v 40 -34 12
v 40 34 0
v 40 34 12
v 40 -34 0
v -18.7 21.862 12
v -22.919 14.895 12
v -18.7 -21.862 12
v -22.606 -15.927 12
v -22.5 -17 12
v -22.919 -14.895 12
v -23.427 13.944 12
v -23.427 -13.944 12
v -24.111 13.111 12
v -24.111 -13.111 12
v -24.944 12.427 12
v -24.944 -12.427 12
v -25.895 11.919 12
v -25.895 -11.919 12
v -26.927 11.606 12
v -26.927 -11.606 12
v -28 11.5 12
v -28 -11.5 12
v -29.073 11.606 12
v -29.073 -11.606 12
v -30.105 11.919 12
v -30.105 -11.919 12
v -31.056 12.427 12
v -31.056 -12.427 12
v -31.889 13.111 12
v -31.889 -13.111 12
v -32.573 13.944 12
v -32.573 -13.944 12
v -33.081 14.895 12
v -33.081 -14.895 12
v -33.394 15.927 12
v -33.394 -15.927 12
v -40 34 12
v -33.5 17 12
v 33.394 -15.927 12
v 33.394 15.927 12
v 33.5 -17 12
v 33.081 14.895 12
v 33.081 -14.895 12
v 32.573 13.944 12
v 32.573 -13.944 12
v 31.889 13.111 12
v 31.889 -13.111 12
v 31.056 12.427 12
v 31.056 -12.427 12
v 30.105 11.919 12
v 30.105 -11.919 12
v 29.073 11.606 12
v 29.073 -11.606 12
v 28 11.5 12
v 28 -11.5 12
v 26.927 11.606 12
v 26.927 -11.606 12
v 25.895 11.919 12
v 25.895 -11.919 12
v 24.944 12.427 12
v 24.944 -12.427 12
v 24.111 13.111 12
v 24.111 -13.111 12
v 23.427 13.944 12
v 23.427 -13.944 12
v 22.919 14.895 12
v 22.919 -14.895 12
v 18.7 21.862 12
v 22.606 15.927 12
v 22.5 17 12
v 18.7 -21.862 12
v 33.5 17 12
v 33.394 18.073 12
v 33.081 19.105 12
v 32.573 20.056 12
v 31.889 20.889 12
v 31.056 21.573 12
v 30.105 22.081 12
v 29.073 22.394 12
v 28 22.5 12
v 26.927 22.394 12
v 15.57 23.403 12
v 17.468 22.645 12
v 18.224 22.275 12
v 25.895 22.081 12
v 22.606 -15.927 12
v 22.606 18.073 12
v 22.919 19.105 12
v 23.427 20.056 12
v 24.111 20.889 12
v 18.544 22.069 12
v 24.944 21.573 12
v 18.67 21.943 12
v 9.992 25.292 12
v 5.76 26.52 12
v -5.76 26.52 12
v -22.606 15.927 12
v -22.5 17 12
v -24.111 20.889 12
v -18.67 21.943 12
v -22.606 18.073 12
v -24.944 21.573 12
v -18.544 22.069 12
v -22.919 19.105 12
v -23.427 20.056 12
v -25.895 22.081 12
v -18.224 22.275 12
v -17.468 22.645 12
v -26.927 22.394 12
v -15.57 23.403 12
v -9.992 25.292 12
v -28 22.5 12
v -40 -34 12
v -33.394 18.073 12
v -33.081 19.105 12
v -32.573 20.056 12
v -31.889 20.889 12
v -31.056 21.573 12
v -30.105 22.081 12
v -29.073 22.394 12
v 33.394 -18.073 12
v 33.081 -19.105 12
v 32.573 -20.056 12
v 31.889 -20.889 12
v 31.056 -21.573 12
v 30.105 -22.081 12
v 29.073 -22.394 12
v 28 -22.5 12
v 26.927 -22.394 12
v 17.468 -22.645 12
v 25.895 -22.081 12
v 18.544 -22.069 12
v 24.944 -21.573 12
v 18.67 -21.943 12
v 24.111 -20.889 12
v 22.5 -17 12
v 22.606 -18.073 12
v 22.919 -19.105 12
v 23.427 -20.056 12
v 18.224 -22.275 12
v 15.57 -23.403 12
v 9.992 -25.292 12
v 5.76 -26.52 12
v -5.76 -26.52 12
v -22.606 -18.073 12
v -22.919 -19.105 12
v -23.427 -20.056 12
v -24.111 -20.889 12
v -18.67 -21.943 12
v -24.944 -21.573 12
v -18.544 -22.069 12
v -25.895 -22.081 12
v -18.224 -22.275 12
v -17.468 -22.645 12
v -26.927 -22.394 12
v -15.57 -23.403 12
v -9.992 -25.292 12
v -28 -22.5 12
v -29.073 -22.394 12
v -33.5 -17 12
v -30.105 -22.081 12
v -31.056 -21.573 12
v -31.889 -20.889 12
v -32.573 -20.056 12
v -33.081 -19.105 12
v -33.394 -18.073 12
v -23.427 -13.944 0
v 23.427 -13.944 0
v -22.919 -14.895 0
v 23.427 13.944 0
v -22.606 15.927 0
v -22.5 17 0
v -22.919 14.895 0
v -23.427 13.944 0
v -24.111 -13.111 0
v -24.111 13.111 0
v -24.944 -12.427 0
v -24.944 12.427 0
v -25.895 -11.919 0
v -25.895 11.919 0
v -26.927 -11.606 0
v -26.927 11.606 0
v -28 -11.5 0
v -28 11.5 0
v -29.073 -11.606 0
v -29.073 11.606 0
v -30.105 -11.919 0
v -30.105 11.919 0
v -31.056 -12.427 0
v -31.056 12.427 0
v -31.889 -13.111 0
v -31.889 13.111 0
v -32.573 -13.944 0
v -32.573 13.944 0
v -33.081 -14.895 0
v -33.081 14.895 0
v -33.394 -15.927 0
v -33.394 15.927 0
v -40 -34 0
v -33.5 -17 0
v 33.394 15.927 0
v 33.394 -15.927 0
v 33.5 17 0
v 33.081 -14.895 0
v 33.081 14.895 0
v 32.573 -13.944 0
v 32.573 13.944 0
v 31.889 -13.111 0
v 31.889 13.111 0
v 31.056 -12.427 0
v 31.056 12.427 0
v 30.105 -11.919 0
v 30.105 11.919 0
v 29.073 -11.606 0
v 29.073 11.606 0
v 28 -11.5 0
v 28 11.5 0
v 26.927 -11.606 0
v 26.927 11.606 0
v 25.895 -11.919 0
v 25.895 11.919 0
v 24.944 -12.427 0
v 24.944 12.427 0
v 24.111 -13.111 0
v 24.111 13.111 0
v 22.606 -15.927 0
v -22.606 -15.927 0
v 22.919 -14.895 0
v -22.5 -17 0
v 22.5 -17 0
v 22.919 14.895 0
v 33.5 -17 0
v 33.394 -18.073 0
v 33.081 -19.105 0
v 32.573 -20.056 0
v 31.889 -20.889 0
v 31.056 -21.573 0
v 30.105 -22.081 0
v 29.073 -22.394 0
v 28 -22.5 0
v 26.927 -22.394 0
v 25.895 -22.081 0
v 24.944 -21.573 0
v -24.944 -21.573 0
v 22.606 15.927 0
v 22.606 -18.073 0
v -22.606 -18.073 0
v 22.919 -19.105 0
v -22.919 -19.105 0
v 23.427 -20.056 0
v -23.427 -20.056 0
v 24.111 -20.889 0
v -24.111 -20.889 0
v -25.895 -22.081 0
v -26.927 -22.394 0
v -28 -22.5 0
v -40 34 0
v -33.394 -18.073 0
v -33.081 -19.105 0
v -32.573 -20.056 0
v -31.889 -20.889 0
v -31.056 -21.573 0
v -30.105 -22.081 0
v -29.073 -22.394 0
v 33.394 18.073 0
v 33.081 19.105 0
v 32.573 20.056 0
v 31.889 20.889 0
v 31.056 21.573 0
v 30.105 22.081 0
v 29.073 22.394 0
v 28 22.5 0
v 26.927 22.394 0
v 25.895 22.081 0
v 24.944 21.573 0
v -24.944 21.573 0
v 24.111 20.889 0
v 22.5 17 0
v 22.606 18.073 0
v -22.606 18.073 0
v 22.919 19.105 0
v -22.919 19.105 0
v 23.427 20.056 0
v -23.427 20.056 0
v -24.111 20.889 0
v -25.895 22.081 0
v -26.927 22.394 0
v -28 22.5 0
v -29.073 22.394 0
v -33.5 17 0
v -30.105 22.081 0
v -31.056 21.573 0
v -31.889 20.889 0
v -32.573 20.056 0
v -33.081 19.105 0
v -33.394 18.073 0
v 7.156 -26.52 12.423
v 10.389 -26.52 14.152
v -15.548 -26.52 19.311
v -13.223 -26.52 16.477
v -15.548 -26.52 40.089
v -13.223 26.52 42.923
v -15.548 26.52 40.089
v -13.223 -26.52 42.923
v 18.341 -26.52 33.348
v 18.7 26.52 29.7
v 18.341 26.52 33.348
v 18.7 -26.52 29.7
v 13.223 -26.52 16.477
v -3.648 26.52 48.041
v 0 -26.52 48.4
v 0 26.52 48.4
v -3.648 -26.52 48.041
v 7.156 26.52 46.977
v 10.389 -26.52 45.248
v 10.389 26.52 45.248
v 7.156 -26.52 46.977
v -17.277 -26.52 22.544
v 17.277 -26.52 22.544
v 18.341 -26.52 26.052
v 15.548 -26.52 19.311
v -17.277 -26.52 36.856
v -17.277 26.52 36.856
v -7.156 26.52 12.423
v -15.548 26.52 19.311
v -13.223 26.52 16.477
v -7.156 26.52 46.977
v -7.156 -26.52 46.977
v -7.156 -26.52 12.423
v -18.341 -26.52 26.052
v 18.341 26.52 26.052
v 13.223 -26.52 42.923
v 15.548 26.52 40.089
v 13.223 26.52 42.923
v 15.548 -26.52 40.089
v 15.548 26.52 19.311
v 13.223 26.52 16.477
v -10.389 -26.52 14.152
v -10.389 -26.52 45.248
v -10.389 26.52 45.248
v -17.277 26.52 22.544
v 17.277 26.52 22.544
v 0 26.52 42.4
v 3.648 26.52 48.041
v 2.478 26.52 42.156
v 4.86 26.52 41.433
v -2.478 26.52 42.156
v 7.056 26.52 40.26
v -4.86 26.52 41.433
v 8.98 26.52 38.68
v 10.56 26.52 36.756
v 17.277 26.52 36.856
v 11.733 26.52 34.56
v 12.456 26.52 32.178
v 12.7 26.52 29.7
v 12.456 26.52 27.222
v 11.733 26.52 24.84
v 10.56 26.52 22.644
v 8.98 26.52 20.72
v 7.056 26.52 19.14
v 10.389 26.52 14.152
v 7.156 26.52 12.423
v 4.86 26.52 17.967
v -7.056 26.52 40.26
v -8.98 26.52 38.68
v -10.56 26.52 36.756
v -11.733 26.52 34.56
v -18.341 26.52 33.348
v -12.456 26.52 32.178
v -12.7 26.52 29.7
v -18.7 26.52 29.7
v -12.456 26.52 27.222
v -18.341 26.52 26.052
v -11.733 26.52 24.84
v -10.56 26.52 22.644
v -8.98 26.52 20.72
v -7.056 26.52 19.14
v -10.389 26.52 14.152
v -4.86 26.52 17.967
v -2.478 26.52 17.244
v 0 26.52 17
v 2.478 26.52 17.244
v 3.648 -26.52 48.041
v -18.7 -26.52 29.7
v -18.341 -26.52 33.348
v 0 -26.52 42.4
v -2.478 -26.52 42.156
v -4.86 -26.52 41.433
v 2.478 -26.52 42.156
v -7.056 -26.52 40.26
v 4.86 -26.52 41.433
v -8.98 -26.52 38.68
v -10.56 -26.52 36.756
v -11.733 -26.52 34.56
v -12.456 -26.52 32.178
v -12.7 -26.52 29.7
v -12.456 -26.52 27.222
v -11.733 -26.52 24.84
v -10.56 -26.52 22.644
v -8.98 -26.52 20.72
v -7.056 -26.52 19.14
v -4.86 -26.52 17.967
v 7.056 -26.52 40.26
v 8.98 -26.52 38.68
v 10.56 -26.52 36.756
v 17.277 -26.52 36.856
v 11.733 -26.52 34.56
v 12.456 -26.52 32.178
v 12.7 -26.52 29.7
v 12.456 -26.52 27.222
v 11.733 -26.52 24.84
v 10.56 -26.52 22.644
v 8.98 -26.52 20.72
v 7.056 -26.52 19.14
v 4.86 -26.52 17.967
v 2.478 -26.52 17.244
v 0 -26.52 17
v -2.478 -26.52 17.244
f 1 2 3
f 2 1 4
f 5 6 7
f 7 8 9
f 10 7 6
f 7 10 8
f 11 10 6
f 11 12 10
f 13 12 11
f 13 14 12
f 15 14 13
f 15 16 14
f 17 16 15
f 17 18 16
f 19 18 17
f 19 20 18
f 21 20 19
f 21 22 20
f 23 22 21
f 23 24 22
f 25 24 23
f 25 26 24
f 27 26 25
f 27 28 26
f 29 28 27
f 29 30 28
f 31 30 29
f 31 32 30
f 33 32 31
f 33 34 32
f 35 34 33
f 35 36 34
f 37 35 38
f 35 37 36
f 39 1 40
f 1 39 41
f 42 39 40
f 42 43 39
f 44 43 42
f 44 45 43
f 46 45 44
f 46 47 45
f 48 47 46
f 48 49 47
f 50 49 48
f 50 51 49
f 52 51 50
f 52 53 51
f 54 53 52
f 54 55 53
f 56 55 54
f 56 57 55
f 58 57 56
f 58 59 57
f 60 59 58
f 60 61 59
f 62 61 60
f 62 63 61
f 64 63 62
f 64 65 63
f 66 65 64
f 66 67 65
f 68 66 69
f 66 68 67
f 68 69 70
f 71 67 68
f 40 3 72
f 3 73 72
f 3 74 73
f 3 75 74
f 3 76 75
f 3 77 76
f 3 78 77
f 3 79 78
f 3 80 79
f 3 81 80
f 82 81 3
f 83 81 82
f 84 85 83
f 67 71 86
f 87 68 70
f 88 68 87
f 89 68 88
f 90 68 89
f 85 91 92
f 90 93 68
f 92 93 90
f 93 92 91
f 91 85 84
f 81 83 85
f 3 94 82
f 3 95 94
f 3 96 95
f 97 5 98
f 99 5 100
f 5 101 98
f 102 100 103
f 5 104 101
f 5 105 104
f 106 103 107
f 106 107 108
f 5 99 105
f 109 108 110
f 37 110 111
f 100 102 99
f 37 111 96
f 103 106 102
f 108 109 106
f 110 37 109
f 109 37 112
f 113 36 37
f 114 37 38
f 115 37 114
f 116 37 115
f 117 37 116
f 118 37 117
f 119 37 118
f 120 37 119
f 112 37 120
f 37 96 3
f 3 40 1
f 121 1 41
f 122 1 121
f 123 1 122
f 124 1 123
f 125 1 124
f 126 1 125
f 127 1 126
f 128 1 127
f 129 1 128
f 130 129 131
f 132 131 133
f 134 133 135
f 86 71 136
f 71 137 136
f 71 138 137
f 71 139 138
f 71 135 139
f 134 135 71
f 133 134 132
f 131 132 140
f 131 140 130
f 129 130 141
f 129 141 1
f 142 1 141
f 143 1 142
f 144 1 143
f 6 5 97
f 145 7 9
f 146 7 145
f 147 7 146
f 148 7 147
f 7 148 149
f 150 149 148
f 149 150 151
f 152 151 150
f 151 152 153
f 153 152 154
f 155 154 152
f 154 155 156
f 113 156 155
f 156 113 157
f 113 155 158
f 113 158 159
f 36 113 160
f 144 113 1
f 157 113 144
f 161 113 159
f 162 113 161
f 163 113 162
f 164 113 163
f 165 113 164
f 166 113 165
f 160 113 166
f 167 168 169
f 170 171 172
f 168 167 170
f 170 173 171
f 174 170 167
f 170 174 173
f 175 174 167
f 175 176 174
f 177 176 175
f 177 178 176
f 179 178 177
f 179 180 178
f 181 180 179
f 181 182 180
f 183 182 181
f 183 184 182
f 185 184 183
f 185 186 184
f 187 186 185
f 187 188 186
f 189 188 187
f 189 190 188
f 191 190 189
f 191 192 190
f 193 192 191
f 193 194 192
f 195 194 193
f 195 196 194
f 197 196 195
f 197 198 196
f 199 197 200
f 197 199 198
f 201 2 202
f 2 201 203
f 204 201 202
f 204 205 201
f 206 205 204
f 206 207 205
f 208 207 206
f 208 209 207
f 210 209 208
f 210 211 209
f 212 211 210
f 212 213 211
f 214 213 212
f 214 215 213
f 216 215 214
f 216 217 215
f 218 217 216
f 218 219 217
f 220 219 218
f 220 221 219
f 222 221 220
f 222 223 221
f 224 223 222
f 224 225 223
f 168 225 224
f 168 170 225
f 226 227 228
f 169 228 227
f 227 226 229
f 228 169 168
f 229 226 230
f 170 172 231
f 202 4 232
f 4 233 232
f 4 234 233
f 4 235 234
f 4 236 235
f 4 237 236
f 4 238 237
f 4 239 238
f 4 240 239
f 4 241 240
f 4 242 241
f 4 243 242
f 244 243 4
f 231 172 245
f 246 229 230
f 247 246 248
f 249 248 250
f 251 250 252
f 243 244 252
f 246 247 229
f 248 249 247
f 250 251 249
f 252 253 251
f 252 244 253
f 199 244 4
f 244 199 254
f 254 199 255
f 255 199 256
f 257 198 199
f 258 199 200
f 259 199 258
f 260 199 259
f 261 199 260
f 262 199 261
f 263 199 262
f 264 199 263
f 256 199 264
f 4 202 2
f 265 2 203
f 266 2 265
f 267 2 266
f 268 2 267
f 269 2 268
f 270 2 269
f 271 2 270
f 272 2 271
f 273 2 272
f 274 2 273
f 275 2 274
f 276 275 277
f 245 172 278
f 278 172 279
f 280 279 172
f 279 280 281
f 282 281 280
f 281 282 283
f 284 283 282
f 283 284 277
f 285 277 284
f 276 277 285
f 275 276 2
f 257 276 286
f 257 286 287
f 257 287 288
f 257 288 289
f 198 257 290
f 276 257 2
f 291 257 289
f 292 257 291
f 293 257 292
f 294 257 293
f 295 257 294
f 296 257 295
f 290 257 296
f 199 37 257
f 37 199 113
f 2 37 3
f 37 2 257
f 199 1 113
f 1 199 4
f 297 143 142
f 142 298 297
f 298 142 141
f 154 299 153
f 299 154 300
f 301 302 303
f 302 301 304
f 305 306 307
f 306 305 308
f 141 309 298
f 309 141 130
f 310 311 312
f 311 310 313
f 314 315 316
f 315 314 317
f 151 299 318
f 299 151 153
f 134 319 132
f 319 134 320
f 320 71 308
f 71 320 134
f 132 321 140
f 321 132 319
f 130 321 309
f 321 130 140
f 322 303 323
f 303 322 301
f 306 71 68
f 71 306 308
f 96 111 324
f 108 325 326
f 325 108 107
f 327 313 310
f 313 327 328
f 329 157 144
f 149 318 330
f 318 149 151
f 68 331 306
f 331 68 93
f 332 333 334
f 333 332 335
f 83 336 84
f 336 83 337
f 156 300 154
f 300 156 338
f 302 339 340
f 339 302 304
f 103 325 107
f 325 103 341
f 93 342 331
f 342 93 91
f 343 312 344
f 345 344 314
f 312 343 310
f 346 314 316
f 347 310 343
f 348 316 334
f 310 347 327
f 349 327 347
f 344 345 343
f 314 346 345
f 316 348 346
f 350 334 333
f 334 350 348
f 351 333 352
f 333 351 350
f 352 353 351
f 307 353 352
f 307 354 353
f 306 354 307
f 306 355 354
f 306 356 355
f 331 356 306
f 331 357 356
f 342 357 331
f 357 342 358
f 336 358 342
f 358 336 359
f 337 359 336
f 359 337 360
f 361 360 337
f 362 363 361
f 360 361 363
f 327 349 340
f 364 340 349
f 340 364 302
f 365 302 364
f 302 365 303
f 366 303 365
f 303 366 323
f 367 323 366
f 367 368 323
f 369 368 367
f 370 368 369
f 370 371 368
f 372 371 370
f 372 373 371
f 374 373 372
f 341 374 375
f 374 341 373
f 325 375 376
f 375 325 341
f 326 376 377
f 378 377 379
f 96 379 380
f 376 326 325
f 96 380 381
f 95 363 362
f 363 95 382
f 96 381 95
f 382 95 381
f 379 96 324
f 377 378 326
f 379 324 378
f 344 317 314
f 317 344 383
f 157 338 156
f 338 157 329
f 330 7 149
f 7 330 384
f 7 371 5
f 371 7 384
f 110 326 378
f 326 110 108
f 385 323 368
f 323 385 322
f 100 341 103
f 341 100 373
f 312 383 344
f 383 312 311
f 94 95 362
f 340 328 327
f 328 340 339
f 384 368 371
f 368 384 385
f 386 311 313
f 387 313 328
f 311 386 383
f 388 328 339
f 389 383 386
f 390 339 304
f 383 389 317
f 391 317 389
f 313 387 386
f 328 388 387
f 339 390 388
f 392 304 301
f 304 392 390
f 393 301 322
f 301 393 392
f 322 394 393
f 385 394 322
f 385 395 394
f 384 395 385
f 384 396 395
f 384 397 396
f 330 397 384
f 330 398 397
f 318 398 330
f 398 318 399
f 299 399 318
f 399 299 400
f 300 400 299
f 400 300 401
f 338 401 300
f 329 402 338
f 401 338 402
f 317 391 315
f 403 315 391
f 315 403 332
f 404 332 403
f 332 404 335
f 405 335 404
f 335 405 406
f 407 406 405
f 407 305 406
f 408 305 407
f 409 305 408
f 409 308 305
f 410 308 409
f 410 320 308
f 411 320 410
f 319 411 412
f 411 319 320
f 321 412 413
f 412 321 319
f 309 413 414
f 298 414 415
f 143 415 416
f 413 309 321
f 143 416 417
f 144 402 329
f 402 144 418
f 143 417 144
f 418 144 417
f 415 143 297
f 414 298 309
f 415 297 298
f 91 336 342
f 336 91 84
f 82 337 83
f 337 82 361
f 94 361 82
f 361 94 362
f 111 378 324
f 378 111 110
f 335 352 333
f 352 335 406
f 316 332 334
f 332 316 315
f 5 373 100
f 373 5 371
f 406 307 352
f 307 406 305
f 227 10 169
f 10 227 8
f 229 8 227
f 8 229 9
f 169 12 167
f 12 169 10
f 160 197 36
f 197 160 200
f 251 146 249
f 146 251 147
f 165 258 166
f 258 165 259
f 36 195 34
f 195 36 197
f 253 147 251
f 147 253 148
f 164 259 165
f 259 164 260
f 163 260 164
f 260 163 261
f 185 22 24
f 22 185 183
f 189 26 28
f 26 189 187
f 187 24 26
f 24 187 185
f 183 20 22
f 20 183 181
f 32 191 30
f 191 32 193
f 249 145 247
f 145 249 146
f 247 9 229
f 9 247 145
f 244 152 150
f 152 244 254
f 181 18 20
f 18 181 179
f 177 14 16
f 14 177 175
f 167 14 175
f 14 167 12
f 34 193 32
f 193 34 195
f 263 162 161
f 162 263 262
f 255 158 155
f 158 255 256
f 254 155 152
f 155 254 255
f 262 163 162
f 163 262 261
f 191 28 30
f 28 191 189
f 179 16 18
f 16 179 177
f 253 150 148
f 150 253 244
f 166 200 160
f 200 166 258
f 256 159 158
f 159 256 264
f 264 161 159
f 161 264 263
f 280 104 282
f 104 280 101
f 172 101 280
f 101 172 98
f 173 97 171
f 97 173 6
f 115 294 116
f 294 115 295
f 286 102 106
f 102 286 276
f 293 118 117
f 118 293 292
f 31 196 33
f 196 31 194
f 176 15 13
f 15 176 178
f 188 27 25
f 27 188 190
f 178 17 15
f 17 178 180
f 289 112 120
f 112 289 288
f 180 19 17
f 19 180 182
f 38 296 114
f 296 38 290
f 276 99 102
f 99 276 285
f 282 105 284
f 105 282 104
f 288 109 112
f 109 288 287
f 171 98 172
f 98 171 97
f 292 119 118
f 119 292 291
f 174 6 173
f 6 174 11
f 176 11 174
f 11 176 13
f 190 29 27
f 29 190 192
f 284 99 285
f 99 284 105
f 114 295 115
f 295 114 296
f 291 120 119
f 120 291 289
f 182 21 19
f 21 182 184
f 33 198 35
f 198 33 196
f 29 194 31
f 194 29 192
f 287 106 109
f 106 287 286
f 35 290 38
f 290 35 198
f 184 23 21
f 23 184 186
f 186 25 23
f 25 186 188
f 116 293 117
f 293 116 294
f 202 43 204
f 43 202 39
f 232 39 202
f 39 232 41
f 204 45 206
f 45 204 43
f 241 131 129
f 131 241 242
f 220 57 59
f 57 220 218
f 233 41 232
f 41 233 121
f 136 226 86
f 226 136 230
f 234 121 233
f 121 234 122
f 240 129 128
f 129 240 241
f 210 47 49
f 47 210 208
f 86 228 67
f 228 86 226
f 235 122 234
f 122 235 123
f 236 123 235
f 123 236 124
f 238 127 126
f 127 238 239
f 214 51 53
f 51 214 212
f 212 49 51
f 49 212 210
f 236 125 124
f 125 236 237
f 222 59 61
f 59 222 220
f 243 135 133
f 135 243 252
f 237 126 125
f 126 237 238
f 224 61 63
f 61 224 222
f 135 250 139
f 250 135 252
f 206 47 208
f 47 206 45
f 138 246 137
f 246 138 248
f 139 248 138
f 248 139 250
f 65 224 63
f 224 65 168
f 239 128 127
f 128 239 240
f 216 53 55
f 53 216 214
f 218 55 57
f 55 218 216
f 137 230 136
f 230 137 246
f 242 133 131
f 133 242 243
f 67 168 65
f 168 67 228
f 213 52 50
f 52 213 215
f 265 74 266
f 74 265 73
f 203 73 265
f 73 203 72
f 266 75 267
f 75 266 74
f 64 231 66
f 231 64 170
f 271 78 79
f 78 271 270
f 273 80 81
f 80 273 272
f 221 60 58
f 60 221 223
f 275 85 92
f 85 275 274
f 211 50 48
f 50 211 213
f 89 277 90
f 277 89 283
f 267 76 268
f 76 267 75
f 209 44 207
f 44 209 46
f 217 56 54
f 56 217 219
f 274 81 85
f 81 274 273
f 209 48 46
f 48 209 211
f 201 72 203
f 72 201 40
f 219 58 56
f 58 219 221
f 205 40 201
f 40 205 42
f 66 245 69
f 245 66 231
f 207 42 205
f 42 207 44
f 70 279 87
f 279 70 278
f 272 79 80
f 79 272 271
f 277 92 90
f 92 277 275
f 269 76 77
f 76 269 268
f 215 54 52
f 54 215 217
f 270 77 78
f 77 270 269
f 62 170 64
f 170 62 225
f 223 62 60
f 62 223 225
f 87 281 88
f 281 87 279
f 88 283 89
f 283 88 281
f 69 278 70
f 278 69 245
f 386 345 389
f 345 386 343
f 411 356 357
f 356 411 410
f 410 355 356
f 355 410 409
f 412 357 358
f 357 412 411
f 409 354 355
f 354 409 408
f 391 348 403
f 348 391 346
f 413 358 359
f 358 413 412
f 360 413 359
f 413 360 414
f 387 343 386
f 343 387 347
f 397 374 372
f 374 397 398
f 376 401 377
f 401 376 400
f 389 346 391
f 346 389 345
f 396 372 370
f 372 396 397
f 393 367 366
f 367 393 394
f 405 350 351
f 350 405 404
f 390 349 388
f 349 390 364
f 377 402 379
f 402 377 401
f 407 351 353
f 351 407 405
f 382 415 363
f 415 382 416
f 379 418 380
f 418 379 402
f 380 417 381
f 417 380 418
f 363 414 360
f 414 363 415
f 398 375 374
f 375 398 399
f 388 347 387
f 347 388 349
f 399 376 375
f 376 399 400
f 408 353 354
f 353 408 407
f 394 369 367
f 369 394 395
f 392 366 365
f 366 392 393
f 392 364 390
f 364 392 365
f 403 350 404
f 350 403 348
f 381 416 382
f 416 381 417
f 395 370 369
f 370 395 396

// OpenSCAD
$fn = 32;

// ----------------------------------------------------------------------
// Bearing block: 80 x 68 mm base, 25.4 mm bore at 29.7 mm
// ----------------------------------------------------------------------

// --- parameters (mm) ---
base_w = 80;              // base width
base_d = 68;              // base depth
base_t = 12;              // base thickness
bore_d = 25.4;            // shaft / bearing bore
house_r = 18.7;           // housing outer radius
house_len = 53.04;        // housing length along the shaft
foot_w = 37.4;            // foot width under the housing
foot_len = 43.04;         // foot length along the shaft
axis_z = 29.7;            // bore axis height above the base
holes_d = 11;             // mounting holes
hole_x = 28;              // mounting hole spacing

difference() {
  union() {
    /* base plate with its underside on z = 0 */
    translate([0, 0, base_t / 2]) cube([base_w, base_d, base_t], center = true);
    /* hull foot: a straight web blending into the round housing */
    hull() {
      translate([0, 0, base_t - 0.5]) cube([foot_w, foot_len, 1.6], center = true);
      translate([0, 0, axis_z]) rotate([-90, 0, 0]) cylinder(h = house_len, d = 2 * house_r, center = true);
    }
  }
  /* bore through the housing, 2.5 mm clear on both sides */
  translate([0, 0, axis_z]) rotate([-90, 0, 0]) cylinder(h = house_len + 5, d = bore_d, center = true);
  /* mounting holes through the base plate */
  for (hx = [-28, 28]) {
    for (hy = [-17, 17]) {
      translate([hx, hy, -2.5]) cylinder(h = base_t + 5, d = holes_d);
    }
  }
}
